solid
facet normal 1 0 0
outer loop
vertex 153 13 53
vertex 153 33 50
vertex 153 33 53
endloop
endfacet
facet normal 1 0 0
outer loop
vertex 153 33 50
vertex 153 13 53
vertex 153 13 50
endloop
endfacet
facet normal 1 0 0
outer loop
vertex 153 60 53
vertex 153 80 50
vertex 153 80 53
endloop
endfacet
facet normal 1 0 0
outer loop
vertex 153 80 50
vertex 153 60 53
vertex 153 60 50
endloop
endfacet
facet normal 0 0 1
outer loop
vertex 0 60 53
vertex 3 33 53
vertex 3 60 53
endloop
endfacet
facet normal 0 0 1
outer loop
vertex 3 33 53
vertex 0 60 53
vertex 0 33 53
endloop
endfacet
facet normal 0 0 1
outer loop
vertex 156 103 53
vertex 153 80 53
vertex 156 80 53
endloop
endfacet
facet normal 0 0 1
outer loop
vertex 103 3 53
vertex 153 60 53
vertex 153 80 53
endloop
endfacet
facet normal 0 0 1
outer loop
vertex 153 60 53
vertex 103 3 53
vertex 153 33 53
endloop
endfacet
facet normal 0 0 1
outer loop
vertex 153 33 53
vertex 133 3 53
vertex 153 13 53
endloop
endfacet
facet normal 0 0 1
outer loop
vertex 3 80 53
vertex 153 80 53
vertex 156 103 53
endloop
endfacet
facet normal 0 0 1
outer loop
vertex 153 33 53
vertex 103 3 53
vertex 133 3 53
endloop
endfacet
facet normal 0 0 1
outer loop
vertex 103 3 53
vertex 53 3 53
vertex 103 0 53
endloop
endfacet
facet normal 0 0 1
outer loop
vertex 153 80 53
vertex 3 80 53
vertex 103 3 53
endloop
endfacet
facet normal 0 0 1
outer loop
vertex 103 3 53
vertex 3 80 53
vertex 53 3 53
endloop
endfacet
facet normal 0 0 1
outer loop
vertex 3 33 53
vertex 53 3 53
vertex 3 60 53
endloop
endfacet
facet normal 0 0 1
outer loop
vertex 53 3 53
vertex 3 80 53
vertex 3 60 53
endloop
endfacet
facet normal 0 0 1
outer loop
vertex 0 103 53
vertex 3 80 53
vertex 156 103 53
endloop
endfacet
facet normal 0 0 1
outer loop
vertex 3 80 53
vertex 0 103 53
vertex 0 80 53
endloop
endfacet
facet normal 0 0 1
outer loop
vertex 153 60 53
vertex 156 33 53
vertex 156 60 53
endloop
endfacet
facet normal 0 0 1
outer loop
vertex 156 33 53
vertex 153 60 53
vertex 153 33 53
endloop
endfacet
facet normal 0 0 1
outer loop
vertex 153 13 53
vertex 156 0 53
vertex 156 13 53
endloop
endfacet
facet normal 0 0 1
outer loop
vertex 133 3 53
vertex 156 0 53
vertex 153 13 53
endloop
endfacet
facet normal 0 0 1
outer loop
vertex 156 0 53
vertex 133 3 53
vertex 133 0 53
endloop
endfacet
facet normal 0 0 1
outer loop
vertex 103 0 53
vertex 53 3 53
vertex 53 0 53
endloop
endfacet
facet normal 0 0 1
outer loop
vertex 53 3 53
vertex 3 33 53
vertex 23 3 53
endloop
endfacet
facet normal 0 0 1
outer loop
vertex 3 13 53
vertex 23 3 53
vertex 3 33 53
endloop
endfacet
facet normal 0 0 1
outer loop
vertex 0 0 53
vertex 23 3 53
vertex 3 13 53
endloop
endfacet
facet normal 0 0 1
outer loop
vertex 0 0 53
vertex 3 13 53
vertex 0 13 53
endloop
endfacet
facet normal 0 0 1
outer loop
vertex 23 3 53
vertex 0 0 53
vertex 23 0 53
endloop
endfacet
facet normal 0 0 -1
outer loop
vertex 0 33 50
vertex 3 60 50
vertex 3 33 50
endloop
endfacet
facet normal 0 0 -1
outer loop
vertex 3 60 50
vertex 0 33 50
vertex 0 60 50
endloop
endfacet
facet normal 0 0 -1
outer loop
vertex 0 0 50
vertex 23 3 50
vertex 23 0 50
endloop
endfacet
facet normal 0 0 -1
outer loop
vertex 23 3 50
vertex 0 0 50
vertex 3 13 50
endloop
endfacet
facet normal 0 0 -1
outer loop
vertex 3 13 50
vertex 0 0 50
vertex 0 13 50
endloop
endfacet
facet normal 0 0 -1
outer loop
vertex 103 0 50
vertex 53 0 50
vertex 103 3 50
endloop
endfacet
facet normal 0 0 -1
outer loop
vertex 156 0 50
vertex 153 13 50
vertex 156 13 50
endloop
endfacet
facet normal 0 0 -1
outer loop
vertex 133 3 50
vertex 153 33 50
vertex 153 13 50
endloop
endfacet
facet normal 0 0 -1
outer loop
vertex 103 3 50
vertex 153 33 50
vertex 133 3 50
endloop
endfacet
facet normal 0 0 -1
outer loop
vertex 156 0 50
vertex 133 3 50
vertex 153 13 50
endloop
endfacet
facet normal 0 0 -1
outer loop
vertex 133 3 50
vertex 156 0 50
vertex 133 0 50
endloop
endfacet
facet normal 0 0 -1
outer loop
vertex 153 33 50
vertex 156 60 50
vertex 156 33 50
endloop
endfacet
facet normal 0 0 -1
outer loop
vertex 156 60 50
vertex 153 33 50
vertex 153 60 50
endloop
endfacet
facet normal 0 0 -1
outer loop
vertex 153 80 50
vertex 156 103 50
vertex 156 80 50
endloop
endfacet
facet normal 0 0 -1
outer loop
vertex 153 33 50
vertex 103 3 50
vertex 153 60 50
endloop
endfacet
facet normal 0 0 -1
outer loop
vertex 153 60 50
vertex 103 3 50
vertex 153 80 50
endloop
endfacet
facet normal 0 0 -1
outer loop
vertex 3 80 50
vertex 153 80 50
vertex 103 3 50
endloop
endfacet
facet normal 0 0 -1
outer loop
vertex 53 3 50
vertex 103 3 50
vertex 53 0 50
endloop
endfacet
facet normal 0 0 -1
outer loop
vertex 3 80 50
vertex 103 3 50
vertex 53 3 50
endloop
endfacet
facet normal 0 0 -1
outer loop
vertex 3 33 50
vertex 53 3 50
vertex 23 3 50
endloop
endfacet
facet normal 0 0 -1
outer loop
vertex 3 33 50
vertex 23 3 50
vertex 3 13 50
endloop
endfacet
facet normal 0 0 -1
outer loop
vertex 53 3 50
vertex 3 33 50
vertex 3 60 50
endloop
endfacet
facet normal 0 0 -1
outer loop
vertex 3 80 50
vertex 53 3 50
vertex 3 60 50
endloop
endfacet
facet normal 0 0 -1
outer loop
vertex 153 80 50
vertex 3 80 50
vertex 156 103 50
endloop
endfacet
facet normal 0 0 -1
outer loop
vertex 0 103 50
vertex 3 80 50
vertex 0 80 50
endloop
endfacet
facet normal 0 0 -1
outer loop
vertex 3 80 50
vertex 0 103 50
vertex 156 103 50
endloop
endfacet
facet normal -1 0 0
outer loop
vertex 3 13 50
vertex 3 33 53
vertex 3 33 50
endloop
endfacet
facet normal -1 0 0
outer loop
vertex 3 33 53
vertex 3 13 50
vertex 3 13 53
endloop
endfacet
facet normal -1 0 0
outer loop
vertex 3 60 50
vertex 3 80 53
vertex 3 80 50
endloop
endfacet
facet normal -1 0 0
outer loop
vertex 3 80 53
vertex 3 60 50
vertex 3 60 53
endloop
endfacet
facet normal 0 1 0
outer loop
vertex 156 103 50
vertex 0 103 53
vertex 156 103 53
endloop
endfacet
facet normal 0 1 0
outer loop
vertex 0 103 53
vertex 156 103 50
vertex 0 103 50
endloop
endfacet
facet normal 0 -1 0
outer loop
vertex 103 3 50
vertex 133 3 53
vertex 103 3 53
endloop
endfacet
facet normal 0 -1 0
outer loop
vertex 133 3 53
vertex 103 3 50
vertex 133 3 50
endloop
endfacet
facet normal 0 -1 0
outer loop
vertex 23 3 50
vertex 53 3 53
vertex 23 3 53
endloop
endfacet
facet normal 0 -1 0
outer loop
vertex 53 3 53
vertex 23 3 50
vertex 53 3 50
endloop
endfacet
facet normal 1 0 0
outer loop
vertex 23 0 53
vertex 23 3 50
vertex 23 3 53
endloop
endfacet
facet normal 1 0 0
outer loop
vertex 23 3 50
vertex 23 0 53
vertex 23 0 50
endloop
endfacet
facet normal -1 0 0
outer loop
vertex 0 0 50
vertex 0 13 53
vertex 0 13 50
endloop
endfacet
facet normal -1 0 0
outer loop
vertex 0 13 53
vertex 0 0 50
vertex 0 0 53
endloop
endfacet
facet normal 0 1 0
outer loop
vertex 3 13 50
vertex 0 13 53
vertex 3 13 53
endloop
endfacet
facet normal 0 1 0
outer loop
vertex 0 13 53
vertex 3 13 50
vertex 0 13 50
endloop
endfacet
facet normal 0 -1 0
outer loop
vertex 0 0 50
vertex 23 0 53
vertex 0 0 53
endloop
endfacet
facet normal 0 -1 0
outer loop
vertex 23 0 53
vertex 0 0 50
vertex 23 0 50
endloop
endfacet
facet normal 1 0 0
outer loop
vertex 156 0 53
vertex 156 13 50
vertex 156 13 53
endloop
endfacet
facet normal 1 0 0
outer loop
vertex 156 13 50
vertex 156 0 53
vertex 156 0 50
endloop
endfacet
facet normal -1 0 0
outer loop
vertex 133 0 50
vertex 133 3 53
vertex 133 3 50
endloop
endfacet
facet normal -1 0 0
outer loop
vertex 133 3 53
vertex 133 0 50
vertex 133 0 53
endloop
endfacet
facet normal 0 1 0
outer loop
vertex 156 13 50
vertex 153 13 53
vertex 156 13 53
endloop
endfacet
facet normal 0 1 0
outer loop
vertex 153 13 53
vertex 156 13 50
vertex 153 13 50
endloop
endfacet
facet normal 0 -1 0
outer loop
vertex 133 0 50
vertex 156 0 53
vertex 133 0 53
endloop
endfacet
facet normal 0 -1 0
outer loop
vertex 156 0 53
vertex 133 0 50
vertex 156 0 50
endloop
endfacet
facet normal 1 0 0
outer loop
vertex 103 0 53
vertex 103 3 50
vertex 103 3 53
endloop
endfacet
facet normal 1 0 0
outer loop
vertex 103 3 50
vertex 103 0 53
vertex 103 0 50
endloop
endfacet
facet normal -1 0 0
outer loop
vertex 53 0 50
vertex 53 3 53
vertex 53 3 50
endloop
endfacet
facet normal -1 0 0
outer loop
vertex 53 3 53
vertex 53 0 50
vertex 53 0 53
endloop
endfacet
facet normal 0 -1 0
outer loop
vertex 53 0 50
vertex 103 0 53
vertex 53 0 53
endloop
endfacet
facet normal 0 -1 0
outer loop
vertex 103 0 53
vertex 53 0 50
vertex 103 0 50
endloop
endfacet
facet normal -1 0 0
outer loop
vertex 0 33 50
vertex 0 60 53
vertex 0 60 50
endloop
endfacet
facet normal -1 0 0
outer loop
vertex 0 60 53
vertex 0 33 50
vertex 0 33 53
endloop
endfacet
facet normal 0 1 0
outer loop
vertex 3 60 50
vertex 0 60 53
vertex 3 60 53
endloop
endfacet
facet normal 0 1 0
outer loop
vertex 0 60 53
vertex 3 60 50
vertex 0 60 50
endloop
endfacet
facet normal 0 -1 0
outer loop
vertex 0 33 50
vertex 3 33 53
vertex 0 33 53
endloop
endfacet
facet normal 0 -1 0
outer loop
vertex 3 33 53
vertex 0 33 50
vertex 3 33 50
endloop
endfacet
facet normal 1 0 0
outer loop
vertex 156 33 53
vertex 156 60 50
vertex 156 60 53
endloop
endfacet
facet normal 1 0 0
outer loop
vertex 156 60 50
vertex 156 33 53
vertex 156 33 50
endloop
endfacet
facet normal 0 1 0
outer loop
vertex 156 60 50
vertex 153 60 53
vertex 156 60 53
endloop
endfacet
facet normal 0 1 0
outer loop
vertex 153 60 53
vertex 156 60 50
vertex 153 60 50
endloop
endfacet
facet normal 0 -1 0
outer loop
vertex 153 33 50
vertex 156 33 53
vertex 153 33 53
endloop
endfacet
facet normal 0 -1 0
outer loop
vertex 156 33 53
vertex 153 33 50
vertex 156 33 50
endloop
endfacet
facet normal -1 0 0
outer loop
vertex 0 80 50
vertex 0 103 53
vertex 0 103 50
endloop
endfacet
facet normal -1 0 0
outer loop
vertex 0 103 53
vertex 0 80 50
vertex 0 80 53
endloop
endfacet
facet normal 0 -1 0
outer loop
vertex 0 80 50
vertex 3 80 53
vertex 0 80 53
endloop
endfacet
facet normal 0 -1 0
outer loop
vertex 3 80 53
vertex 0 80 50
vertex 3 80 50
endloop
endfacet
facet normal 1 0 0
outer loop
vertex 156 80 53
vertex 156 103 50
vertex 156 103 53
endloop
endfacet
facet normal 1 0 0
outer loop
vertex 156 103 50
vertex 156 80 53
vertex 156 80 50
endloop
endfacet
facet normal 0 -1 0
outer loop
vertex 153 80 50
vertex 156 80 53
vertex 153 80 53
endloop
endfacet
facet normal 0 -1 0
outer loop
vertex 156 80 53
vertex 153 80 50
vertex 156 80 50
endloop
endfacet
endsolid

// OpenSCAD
module part04 (){
    translate([3,3,50])color("blue") cube([150,100,3]);
    translate([0,0,50])color("blue") cube([23,13,3]);
    translate([133,0,50])color("blue") cube([23,13,3]);
    translate([53,0,50])color("blue") cube([50,3,3]);
    translate([0,33,50])color("blue") cube([3,27,3]);
    translate([153,33,50])color("blue") cube([3,27,3]);
    translate([0,80,50])color("blue") cube([3,23,3]);
    translate([153,80,50])color("blue") cube([3,23,3]);
}

//use <part01.scad>;
//use <part02.scad>;
//use <part03.scad>;
//
//part01();
//part02();
//part03();
//// zweites Seitenteil
//translate([15.3,0,0]) part03();

part04();
